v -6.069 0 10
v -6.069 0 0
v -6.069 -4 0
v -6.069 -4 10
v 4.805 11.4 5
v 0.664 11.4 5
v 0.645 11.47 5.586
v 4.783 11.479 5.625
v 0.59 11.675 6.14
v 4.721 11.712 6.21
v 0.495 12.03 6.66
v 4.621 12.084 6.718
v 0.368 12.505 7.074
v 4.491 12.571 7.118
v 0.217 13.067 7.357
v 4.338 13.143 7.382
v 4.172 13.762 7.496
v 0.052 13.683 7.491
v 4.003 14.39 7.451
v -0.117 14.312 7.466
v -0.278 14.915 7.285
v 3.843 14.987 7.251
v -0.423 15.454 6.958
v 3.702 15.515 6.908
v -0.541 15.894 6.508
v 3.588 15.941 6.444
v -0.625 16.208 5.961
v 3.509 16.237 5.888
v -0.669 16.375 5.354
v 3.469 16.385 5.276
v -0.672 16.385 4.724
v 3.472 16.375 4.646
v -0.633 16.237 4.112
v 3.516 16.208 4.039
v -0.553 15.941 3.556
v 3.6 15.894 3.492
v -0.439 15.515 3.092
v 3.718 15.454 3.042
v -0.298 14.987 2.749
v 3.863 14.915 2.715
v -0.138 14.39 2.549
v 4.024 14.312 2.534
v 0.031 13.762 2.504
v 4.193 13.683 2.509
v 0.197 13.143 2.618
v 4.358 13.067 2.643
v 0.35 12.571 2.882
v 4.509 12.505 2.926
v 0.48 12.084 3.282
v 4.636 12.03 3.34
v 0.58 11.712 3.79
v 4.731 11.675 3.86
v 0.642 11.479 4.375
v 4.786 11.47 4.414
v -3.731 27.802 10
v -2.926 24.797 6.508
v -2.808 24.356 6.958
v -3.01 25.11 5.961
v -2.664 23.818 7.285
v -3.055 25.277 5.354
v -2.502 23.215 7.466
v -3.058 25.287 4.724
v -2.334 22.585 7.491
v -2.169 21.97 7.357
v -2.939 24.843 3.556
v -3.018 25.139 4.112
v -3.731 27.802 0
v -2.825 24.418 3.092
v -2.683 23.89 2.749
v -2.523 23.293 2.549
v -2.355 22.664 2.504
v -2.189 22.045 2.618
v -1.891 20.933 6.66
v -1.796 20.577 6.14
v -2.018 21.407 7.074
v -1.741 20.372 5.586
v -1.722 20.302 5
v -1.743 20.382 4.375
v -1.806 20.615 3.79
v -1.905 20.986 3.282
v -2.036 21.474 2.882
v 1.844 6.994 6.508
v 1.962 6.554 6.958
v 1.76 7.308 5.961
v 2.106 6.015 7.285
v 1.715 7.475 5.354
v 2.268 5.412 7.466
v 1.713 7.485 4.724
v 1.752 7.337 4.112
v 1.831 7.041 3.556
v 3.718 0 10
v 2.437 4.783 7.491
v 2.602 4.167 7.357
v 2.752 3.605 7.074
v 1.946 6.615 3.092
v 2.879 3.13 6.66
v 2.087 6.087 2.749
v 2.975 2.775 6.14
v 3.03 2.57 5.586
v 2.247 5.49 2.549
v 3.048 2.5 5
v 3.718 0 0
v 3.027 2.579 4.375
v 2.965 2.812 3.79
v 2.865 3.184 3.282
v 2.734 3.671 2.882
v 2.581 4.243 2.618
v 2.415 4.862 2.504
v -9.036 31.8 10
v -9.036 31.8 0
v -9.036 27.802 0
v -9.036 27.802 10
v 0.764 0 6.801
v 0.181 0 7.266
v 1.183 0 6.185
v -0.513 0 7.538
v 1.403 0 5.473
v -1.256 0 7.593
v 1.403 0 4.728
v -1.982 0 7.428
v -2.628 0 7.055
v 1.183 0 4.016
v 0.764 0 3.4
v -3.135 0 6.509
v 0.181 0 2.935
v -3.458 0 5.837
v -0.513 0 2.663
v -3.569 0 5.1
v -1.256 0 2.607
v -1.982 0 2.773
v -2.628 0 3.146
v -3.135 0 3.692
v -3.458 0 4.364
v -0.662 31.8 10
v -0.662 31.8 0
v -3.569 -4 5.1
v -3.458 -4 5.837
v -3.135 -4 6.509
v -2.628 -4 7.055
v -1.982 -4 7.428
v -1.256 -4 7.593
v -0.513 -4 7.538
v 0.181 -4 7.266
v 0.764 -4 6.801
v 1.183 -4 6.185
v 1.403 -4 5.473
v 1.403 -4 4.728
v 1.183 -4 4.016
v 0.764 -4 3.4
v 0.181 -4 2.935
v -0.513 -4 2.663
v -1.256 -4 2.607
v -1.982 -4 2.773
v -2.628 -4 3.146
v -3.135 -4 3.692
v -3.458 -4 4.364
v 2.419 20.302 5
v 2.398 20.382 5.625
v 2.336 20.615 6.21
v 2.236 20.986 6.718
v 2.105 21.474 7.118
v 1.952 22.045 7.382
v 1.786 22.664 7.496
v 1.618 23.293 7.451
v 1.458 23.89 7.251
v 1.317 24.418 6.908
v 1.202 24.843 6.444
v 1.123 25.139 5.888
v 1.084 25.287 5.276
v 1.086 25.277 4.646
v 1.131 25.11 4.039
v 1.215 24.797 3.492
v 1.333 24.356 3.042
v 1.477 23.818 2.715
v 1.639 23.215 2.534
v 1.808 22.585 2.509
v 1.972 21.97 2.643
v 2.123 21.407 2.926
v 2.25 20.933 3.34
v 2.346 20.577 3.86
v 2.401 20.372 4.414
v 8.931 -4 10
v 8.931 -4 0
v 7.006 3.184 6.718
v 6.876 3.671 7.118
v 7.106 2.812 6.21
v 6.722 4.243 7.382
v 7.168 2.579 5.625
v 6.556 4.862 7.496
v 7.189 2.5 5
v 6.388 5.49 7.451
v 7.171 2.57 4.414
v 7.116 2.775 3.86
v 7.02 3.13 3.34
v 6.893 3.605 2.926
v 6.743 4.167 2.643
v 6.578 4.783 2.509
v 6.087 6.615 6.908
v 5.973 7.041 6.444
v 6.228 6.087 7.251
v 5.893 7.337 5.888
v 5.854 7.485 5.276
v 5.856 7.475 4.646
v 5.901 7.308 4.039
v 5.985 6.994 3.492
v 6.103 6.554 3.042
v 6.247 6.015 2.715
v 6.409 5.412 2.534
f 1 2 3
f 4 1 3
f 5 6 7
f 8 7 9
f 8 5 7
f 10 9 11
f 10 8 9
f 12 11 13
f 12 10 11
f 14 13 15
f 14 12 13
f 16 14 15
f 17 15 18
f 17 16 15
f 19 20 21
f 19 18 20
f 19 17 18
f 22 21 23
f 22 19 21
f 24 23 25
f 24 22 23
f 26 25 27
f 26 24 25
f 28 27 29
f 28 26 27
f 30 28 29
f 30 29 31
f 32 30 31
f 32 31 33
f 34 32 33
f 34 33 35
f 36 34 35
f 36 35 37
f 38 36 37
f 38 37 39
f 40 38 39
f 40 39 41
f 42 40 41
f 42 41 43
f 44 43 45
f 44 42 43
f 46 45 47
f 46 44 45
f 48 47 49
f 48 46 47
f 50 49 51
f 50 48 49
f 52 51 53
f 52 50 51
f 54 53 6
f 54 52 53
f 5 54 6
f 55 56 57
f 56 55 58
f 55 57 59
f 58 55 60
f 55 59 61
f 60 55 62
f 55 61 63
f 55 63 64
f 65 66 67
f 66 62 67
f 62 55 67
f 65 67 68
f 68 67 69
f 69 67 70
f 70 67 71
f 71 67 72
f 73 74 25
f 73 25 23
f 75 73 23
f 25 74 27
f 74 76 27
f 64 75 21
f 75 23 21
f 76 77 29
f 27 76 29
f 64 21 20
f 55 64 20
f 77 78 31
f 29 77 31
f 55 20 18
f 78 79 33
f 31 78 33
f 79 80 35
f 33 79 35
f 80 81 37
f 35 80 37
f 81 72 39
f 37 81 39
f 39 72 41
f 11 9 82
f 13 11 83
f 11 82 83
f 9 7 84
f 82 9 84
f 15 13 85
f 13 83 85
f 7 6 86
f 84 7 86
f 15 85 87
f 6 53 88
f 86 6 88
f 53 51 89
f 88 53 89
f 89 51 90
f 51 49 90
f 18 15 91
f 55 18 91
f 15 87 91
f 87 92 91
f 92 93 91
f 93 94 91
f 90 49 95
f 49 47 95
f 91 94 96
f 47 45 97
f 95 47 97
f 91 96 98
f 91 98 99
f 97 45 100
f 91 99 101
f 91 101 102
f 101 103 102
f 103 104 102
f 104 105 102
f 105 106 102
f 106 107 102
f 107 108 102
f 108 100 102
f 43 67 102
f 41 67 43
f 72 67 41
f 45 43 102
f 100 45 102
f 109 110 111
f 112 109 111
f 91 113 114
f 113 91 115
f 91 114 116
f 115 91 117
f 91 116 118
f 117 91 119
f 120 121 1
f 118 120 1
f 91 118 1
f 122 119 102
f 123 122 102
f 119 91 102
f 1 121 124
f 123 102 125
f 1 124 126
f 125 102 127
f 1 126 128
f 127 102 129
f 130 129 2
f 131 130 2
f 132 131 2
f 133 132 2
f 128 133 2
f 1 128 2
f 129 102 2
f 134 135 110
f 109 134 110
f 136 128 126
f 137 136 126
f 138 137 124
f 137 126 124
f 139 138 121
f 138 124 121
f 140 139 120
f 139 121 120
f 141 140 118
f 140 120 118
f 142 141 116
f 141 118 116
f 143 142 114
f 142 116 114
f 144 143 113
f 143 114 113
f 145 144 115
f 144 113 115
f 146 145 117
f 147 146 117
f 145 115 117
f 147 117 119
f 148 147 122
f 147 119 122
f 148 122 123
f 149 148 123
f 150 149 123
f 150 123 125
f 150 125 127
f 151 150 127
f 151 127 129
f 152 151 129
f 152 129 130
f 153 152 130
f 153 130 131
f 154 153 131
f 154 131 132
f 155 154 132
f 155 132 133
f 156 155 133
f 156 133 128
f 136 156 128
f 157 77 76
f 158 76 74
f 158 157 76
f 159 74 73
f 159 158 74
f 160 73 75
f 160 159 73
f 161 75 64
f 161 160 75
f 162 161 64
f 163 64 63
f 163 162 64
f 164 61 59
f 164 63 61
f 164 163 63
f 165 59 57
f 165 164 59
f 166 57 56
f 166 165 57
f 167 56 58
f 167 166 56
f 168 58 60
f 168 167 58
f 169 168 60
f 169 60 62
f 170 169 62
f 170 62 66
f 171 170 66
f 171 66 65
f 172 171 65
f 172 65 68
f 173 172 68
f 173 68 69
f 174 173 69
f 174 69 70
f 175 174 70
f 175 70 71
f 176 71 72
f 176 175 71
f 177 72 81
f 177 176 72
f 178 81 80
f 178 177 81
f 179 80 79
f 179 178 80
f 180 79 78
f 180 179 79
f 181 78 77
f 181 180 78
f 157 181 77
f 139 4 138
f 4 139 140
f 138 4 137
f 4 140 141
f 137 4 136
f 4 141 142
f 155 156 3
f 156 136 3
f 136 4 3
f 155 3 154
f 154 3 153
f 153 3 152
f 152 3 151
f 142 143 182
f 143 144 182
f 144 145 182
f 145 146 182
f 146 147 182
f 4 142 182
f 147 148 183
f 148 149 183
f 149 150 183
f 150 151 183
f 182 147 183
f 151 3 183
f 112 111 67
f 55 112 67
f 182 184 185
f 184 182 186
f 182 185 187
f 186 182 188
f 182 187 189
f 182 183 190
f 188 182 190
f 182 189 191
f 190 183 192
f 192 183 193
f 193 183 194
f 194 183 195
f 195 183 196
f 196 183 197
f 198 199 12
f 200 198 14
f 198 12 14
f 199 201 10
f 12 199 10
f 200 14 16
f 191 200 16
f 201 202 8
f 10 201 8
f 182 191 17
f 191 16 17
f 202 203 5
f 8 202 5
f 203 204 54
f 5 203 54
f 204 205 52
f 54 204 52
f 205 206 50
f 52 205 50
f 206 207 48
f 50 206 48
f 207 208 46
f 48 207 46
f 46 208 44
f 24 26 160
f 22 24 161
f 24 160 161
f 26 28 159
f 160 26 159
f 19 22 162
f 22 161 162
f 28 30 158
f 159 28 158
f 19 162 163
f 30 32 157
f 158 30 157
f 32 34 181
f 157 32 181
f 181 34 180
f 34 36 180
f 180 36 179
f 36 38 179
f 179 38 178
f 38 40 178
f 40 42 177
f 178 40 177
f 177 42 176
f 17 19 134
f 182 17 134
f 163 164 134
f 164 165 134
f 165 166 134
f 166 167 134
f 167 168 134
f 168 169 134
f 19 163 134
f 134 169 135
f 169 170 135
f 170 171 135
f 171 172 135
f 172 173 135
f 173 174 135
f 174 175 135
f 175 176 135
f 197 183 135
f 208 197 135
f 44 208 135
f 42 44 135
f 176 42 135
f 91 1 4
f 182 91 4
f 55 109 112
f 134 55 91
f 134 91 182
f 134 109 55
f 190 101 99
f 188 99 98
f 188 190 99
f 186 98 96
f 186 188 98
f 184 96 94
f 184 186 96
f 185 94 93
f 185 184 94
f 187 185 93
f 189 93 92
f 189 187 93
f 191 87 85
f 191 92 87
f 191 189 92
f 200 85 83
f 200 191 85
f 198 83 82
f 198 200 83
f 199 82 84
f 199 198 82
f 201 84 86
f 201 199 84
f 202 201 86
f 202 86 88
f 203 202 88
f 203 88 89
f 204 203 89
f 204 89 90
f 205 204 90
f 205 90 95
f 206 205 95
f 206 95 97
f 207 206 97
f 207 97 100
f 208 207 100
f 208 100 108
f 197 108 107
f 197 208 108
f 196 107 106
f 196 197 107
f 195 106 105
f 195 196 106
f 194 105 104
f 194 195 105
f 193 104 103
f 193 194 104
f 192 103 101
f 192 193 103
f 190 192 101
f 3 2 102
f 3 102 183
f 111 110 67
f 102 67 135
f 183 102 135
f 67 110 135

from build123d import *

# Parameters (mm, degrees)
BOSS_EXTRUDE1_DEPTH     = 10
CUT_EXTRUDE1_DEPTH      = 10
CUT_EXTRUDE1_DEPTH_BACK = 15
SKETCH2_R               = 2.5
SKETCH3_R               = 2.5
CUT_EXTRUDE2_DEPTH      = 15


with BuildPart() as part:
    # Sketch1 → Boss-Extrude1 (new body)
    with BuildSketch(Plane.XY):
        Polygon((-6.068965517, -4), (8.931034483, -4), (-0.661546606, 31.8), (-9.036163723, 31.8), (-9.036163723, 27.802335145), (-3.731480258, 27.802335145), (3.718132991, 0), (-6.068965517, 0), align=None)
    extrude(amount=BOSS_EXTRUDE1_DEPTH)

    # Sketch2 → Cut-Extrude1 (cut, two sides: drawn at the far end of the back side and taken through both)
    with BuildSketch(Plane.ZY.offset(6.068965517).offset(-CUT_EXTRUDE1_DEPTH_BACK)):
        with Locations(Location((5, 22.802335145, 0), (0, 0, 270))):
            Circle(SKETCH2_R)
        with Locations(Location((5, 5, 0), (0, 0, 270))):
            Circle(SKETCH2_R)
        with Locations(Location((5, 13.9, 0), (0, 0, 270))):
            Circle(SKETCH2_R)
    extrude(amount=CUT_EXTRUDE1_DEPTH + CUT_EXTRUDE1_DEPTH_BACK, mode=Mode.SUBTRACT)

    # Sketch3 → Cut-Extrude2 (cut)
    with BuildSketch(Plane(origin=(0, 0, 0), x_dir=(1, 0, 0), z_dir=(0, 1, 0))):
        with Locations(Location((-1.068965517, -5.100482612, 0), (0, 0, 180))):
            Circle(SKETCH3_R)
    extrude(amount=-CUT_EXTRUDE2_DEPTH, mode=Mode.SUBTRACT)


solid = part.part
